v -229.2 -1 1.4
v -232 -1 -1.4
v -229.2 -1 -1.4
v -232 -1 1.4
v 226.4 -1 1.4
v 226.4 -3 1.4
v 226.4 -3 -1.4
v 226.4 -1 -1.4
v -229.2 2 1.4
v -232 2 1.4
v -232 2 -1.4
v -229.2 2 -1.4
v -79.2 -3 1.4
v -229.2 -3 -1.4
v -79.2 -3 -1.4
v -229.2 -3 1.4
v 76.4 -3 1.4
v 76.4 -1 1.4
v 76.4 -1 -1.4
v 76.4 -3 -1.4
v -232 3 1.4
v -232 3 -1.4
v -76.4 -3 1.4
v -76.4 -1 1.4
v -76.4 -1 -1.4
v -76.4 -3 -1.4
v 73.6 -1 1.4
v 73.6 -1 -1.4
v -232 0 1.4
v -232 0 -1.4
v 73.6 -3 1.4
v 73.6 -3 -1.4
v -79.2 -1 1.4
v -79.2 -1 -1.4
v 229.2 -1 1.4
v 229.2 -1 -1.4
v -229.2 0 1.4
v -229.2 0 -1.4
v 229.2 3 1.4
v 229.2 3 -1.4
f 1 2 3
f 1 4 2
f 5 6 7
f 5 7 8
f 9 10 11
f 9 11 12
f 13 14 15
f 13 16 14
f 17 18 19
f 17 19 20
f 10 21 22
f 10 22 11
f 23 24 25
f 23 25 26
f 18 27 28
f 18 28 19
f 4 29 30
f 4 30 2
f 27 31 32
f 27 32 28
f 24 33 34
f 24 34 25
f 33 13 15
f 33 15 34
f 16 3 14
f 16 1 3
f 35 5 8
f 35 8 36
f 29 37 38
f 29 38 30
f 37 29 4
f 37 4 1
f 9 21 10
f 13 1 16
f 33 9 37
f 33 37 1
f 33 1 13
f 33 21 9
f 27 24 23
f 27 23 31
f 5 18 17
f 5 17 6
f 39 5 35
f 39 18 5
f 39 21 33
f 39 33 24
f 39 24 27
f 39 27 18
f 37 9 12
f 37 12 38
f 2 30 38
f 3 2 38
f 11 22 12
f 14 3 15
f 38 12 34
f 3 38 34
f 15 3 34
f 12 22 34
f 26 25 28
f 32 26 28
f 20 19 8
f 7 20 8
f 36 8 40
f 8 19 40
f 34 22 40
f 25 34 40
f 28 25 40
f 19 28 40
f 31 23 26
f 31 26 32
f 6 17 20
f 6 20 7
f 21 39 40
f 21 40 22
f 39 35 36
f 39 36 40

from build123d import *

# Parameters (mm, degrees)
EXTRUDE_1_DEPTH = 1.4


with BuildPart() as part:
    # Эскиз2 → Бобышка-Вытянуть1 (new, symmetric)
    with BuildSketch(Plane.XY):
        Polygon((-229.2, -3), (-79.2, -3), (-79.2, -1), (-76.4, -1), (-76.4, -3), (73.6, -3), (73.6, -1), (76.4, -1), (76.4, -3), (226.4, -3), (226.4, -1), (229.2, -1), (229.2, 3), (-229.2, 3), (-232, 3), (-232, 2), (-229.2, 2), (-229.2, 0), (-232, 0), (-232, -1), (-229.2, -1), align=None)
    extrude(amount=EXTRUDE_1_DEPTH, both=True)


solid = part.part
